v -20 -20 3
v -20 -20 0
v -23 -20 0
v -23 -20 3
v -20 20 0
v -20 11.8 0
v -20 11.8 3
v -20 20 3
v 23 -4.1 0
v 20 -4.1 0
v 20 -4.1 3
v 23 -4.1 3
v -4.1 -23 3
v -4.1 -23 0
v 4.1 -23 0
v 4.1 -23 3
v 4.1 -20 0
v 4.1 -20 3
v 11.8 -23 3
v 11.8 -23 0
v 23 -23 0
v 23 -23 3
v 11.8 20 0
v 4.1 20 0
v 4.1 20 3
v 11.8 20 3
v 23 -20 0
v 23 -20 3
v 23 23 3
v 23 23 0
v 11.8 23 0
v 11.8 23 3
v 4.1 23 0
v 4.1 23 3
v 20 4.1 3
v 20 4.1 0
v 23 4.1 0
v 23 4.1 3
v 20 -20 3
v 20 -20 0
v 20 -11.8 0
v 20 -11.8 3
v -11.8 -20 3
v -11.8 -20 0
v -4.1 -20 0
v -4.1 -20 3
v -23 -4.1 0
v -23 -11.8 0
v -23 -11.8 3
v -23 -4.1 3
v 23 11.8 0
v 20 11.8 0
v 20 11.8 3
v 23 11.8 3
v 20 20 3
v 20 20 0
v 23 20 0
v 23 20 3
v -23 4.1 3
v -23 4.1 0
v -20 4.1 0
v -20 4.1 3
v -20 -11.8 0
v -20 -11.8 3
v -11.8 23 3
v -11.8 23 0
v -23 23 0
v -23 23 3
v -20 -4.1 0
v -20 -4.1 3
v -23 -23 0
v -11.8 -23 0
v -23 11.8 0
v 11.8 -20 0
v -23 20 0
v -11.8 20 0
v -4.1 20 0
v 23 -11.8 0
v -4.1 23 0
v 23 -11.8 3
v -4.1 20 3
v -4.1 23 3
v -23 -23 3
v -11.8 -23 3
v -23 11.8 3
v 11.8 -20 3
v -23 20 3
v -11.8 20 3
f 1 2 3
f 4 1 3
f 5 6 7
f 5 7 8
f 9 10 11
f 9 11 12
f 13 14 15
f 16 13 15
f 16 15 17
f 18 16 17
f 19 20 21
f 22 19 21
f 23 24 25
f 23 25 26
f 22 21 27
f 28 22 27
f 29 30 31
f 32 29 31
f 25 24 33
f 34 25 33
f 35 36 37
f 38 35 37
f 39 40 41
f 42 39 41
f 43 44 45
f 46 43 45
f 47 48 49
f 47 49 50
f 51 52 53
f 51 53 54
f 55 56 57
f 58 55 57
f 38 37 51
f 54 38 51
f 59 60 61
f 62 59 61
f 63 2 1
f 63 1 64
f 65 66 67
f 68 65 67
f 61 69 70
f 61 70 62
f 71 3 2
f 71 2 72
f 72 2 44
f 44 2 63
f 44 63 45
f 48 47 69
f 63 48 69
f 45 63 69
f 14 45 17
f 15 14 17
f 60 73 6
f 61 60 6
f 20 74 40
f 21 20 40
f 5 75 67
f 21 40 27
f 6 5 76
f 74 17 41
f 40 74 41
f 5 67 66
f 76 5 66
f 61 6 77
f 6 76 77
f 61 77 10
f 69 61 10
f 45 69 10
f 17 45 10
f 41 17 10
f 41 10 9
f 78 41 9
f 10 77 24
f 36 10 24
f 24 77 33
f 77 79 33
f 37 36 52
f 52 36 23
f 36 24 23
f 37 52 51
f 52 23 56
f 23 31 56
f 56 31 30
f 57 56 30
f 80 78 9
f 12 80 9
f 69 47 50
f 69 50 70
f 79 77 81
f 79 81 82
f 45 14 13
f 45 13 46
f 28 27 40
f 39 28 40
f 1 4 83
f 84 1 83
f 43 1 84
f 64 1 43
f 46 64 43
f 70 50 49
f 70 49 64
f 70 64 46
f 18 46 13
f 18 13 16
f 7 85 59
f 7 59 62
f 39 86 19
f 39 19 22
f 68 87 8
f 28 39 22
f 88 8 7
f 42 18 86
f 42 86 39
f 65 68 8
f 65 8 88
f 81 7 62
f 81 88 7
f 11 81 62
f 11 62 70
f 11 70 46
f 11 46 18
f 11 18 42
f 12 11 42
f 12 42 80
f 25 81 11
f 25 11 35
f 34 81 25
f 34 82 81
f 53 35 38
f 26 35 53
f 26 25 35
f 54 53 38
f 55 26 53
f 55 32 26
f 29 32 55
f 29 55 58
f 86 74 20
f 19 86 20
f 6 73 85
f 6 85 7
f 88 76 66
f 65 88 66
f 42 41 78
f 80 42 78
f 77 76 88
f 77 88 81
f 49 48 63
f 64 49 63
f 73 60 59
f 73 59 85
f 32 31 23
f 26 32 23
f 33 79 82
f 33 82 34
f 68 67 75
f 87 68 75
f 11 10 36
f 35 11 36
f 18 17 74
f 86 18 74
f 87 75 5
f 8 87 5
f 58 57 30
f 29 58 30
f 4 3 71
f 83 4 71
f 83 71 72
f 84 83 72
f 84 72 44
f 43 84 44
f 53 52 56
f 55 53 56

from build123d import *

# Parameters (mm, degrees)
CROQUIS1_W              = 8.2
CROQUIS1_H              = 3
CROQUIS1_W_2            = 3
CROQUIS1_H_2            = 7.7
CROQUIS1_W_3            = 40
CROQUIS1_H_3            = 40
SALIENTE_EXTRUIR1_DEPTH = 3


with BuildPart() as part:
    # Croquis1 → Saliente-Extruir1 (new body)
    with BuildSketch(Plane.XY):
        Polygon((-20, 20), (-11.8, 20), (-11.8, 23), (-23, 23), (-23, 20), align=None)
        with Locations((0, 21.5)):
            Rectangle(CROQUIS1_W, CROQUIS1_H)
        Polygon((11.8, 20), (20, 20), (23, 20), (23, 23), (11.8, 23), align=None)
        with Locations((21.5, 7.95)):
            Rectangle(CROQUIS1_W_2, CROQUIS1_H_2)
        with Locations((21.5, -7.95)):
            Rectangle(CROQUIS1_W_2, CROQUIS1_H_2)
        Polygon((23, -20), (20, -20), (11.8, -20), (11.8, -23), (23, -23), align=None)
        with Locations((0, -21.5)):
            Rectangle(CROQUIS1_W, CROQUIS1_H)
        Polygon((-11.8, -23), (-11.8, -20), (-20, -20), (-23, -20), (-23, -23), align=None)
        with Locations((-21.5, 7.95)):
            Rectangle(CROQUIS1_W_2, CROQUIS1_H_2)
        Rectangle(CROQUIS1_W_3, CROQUIS1_H_3)
        with Locations((-21.5, -7.95)):
            Rectangle(CROQUIS1_W_2, CROQUIS1_H_2)
    extrude(amount=SALIENTE_EXTRUIR1_DEPTH)


solid = part.part
